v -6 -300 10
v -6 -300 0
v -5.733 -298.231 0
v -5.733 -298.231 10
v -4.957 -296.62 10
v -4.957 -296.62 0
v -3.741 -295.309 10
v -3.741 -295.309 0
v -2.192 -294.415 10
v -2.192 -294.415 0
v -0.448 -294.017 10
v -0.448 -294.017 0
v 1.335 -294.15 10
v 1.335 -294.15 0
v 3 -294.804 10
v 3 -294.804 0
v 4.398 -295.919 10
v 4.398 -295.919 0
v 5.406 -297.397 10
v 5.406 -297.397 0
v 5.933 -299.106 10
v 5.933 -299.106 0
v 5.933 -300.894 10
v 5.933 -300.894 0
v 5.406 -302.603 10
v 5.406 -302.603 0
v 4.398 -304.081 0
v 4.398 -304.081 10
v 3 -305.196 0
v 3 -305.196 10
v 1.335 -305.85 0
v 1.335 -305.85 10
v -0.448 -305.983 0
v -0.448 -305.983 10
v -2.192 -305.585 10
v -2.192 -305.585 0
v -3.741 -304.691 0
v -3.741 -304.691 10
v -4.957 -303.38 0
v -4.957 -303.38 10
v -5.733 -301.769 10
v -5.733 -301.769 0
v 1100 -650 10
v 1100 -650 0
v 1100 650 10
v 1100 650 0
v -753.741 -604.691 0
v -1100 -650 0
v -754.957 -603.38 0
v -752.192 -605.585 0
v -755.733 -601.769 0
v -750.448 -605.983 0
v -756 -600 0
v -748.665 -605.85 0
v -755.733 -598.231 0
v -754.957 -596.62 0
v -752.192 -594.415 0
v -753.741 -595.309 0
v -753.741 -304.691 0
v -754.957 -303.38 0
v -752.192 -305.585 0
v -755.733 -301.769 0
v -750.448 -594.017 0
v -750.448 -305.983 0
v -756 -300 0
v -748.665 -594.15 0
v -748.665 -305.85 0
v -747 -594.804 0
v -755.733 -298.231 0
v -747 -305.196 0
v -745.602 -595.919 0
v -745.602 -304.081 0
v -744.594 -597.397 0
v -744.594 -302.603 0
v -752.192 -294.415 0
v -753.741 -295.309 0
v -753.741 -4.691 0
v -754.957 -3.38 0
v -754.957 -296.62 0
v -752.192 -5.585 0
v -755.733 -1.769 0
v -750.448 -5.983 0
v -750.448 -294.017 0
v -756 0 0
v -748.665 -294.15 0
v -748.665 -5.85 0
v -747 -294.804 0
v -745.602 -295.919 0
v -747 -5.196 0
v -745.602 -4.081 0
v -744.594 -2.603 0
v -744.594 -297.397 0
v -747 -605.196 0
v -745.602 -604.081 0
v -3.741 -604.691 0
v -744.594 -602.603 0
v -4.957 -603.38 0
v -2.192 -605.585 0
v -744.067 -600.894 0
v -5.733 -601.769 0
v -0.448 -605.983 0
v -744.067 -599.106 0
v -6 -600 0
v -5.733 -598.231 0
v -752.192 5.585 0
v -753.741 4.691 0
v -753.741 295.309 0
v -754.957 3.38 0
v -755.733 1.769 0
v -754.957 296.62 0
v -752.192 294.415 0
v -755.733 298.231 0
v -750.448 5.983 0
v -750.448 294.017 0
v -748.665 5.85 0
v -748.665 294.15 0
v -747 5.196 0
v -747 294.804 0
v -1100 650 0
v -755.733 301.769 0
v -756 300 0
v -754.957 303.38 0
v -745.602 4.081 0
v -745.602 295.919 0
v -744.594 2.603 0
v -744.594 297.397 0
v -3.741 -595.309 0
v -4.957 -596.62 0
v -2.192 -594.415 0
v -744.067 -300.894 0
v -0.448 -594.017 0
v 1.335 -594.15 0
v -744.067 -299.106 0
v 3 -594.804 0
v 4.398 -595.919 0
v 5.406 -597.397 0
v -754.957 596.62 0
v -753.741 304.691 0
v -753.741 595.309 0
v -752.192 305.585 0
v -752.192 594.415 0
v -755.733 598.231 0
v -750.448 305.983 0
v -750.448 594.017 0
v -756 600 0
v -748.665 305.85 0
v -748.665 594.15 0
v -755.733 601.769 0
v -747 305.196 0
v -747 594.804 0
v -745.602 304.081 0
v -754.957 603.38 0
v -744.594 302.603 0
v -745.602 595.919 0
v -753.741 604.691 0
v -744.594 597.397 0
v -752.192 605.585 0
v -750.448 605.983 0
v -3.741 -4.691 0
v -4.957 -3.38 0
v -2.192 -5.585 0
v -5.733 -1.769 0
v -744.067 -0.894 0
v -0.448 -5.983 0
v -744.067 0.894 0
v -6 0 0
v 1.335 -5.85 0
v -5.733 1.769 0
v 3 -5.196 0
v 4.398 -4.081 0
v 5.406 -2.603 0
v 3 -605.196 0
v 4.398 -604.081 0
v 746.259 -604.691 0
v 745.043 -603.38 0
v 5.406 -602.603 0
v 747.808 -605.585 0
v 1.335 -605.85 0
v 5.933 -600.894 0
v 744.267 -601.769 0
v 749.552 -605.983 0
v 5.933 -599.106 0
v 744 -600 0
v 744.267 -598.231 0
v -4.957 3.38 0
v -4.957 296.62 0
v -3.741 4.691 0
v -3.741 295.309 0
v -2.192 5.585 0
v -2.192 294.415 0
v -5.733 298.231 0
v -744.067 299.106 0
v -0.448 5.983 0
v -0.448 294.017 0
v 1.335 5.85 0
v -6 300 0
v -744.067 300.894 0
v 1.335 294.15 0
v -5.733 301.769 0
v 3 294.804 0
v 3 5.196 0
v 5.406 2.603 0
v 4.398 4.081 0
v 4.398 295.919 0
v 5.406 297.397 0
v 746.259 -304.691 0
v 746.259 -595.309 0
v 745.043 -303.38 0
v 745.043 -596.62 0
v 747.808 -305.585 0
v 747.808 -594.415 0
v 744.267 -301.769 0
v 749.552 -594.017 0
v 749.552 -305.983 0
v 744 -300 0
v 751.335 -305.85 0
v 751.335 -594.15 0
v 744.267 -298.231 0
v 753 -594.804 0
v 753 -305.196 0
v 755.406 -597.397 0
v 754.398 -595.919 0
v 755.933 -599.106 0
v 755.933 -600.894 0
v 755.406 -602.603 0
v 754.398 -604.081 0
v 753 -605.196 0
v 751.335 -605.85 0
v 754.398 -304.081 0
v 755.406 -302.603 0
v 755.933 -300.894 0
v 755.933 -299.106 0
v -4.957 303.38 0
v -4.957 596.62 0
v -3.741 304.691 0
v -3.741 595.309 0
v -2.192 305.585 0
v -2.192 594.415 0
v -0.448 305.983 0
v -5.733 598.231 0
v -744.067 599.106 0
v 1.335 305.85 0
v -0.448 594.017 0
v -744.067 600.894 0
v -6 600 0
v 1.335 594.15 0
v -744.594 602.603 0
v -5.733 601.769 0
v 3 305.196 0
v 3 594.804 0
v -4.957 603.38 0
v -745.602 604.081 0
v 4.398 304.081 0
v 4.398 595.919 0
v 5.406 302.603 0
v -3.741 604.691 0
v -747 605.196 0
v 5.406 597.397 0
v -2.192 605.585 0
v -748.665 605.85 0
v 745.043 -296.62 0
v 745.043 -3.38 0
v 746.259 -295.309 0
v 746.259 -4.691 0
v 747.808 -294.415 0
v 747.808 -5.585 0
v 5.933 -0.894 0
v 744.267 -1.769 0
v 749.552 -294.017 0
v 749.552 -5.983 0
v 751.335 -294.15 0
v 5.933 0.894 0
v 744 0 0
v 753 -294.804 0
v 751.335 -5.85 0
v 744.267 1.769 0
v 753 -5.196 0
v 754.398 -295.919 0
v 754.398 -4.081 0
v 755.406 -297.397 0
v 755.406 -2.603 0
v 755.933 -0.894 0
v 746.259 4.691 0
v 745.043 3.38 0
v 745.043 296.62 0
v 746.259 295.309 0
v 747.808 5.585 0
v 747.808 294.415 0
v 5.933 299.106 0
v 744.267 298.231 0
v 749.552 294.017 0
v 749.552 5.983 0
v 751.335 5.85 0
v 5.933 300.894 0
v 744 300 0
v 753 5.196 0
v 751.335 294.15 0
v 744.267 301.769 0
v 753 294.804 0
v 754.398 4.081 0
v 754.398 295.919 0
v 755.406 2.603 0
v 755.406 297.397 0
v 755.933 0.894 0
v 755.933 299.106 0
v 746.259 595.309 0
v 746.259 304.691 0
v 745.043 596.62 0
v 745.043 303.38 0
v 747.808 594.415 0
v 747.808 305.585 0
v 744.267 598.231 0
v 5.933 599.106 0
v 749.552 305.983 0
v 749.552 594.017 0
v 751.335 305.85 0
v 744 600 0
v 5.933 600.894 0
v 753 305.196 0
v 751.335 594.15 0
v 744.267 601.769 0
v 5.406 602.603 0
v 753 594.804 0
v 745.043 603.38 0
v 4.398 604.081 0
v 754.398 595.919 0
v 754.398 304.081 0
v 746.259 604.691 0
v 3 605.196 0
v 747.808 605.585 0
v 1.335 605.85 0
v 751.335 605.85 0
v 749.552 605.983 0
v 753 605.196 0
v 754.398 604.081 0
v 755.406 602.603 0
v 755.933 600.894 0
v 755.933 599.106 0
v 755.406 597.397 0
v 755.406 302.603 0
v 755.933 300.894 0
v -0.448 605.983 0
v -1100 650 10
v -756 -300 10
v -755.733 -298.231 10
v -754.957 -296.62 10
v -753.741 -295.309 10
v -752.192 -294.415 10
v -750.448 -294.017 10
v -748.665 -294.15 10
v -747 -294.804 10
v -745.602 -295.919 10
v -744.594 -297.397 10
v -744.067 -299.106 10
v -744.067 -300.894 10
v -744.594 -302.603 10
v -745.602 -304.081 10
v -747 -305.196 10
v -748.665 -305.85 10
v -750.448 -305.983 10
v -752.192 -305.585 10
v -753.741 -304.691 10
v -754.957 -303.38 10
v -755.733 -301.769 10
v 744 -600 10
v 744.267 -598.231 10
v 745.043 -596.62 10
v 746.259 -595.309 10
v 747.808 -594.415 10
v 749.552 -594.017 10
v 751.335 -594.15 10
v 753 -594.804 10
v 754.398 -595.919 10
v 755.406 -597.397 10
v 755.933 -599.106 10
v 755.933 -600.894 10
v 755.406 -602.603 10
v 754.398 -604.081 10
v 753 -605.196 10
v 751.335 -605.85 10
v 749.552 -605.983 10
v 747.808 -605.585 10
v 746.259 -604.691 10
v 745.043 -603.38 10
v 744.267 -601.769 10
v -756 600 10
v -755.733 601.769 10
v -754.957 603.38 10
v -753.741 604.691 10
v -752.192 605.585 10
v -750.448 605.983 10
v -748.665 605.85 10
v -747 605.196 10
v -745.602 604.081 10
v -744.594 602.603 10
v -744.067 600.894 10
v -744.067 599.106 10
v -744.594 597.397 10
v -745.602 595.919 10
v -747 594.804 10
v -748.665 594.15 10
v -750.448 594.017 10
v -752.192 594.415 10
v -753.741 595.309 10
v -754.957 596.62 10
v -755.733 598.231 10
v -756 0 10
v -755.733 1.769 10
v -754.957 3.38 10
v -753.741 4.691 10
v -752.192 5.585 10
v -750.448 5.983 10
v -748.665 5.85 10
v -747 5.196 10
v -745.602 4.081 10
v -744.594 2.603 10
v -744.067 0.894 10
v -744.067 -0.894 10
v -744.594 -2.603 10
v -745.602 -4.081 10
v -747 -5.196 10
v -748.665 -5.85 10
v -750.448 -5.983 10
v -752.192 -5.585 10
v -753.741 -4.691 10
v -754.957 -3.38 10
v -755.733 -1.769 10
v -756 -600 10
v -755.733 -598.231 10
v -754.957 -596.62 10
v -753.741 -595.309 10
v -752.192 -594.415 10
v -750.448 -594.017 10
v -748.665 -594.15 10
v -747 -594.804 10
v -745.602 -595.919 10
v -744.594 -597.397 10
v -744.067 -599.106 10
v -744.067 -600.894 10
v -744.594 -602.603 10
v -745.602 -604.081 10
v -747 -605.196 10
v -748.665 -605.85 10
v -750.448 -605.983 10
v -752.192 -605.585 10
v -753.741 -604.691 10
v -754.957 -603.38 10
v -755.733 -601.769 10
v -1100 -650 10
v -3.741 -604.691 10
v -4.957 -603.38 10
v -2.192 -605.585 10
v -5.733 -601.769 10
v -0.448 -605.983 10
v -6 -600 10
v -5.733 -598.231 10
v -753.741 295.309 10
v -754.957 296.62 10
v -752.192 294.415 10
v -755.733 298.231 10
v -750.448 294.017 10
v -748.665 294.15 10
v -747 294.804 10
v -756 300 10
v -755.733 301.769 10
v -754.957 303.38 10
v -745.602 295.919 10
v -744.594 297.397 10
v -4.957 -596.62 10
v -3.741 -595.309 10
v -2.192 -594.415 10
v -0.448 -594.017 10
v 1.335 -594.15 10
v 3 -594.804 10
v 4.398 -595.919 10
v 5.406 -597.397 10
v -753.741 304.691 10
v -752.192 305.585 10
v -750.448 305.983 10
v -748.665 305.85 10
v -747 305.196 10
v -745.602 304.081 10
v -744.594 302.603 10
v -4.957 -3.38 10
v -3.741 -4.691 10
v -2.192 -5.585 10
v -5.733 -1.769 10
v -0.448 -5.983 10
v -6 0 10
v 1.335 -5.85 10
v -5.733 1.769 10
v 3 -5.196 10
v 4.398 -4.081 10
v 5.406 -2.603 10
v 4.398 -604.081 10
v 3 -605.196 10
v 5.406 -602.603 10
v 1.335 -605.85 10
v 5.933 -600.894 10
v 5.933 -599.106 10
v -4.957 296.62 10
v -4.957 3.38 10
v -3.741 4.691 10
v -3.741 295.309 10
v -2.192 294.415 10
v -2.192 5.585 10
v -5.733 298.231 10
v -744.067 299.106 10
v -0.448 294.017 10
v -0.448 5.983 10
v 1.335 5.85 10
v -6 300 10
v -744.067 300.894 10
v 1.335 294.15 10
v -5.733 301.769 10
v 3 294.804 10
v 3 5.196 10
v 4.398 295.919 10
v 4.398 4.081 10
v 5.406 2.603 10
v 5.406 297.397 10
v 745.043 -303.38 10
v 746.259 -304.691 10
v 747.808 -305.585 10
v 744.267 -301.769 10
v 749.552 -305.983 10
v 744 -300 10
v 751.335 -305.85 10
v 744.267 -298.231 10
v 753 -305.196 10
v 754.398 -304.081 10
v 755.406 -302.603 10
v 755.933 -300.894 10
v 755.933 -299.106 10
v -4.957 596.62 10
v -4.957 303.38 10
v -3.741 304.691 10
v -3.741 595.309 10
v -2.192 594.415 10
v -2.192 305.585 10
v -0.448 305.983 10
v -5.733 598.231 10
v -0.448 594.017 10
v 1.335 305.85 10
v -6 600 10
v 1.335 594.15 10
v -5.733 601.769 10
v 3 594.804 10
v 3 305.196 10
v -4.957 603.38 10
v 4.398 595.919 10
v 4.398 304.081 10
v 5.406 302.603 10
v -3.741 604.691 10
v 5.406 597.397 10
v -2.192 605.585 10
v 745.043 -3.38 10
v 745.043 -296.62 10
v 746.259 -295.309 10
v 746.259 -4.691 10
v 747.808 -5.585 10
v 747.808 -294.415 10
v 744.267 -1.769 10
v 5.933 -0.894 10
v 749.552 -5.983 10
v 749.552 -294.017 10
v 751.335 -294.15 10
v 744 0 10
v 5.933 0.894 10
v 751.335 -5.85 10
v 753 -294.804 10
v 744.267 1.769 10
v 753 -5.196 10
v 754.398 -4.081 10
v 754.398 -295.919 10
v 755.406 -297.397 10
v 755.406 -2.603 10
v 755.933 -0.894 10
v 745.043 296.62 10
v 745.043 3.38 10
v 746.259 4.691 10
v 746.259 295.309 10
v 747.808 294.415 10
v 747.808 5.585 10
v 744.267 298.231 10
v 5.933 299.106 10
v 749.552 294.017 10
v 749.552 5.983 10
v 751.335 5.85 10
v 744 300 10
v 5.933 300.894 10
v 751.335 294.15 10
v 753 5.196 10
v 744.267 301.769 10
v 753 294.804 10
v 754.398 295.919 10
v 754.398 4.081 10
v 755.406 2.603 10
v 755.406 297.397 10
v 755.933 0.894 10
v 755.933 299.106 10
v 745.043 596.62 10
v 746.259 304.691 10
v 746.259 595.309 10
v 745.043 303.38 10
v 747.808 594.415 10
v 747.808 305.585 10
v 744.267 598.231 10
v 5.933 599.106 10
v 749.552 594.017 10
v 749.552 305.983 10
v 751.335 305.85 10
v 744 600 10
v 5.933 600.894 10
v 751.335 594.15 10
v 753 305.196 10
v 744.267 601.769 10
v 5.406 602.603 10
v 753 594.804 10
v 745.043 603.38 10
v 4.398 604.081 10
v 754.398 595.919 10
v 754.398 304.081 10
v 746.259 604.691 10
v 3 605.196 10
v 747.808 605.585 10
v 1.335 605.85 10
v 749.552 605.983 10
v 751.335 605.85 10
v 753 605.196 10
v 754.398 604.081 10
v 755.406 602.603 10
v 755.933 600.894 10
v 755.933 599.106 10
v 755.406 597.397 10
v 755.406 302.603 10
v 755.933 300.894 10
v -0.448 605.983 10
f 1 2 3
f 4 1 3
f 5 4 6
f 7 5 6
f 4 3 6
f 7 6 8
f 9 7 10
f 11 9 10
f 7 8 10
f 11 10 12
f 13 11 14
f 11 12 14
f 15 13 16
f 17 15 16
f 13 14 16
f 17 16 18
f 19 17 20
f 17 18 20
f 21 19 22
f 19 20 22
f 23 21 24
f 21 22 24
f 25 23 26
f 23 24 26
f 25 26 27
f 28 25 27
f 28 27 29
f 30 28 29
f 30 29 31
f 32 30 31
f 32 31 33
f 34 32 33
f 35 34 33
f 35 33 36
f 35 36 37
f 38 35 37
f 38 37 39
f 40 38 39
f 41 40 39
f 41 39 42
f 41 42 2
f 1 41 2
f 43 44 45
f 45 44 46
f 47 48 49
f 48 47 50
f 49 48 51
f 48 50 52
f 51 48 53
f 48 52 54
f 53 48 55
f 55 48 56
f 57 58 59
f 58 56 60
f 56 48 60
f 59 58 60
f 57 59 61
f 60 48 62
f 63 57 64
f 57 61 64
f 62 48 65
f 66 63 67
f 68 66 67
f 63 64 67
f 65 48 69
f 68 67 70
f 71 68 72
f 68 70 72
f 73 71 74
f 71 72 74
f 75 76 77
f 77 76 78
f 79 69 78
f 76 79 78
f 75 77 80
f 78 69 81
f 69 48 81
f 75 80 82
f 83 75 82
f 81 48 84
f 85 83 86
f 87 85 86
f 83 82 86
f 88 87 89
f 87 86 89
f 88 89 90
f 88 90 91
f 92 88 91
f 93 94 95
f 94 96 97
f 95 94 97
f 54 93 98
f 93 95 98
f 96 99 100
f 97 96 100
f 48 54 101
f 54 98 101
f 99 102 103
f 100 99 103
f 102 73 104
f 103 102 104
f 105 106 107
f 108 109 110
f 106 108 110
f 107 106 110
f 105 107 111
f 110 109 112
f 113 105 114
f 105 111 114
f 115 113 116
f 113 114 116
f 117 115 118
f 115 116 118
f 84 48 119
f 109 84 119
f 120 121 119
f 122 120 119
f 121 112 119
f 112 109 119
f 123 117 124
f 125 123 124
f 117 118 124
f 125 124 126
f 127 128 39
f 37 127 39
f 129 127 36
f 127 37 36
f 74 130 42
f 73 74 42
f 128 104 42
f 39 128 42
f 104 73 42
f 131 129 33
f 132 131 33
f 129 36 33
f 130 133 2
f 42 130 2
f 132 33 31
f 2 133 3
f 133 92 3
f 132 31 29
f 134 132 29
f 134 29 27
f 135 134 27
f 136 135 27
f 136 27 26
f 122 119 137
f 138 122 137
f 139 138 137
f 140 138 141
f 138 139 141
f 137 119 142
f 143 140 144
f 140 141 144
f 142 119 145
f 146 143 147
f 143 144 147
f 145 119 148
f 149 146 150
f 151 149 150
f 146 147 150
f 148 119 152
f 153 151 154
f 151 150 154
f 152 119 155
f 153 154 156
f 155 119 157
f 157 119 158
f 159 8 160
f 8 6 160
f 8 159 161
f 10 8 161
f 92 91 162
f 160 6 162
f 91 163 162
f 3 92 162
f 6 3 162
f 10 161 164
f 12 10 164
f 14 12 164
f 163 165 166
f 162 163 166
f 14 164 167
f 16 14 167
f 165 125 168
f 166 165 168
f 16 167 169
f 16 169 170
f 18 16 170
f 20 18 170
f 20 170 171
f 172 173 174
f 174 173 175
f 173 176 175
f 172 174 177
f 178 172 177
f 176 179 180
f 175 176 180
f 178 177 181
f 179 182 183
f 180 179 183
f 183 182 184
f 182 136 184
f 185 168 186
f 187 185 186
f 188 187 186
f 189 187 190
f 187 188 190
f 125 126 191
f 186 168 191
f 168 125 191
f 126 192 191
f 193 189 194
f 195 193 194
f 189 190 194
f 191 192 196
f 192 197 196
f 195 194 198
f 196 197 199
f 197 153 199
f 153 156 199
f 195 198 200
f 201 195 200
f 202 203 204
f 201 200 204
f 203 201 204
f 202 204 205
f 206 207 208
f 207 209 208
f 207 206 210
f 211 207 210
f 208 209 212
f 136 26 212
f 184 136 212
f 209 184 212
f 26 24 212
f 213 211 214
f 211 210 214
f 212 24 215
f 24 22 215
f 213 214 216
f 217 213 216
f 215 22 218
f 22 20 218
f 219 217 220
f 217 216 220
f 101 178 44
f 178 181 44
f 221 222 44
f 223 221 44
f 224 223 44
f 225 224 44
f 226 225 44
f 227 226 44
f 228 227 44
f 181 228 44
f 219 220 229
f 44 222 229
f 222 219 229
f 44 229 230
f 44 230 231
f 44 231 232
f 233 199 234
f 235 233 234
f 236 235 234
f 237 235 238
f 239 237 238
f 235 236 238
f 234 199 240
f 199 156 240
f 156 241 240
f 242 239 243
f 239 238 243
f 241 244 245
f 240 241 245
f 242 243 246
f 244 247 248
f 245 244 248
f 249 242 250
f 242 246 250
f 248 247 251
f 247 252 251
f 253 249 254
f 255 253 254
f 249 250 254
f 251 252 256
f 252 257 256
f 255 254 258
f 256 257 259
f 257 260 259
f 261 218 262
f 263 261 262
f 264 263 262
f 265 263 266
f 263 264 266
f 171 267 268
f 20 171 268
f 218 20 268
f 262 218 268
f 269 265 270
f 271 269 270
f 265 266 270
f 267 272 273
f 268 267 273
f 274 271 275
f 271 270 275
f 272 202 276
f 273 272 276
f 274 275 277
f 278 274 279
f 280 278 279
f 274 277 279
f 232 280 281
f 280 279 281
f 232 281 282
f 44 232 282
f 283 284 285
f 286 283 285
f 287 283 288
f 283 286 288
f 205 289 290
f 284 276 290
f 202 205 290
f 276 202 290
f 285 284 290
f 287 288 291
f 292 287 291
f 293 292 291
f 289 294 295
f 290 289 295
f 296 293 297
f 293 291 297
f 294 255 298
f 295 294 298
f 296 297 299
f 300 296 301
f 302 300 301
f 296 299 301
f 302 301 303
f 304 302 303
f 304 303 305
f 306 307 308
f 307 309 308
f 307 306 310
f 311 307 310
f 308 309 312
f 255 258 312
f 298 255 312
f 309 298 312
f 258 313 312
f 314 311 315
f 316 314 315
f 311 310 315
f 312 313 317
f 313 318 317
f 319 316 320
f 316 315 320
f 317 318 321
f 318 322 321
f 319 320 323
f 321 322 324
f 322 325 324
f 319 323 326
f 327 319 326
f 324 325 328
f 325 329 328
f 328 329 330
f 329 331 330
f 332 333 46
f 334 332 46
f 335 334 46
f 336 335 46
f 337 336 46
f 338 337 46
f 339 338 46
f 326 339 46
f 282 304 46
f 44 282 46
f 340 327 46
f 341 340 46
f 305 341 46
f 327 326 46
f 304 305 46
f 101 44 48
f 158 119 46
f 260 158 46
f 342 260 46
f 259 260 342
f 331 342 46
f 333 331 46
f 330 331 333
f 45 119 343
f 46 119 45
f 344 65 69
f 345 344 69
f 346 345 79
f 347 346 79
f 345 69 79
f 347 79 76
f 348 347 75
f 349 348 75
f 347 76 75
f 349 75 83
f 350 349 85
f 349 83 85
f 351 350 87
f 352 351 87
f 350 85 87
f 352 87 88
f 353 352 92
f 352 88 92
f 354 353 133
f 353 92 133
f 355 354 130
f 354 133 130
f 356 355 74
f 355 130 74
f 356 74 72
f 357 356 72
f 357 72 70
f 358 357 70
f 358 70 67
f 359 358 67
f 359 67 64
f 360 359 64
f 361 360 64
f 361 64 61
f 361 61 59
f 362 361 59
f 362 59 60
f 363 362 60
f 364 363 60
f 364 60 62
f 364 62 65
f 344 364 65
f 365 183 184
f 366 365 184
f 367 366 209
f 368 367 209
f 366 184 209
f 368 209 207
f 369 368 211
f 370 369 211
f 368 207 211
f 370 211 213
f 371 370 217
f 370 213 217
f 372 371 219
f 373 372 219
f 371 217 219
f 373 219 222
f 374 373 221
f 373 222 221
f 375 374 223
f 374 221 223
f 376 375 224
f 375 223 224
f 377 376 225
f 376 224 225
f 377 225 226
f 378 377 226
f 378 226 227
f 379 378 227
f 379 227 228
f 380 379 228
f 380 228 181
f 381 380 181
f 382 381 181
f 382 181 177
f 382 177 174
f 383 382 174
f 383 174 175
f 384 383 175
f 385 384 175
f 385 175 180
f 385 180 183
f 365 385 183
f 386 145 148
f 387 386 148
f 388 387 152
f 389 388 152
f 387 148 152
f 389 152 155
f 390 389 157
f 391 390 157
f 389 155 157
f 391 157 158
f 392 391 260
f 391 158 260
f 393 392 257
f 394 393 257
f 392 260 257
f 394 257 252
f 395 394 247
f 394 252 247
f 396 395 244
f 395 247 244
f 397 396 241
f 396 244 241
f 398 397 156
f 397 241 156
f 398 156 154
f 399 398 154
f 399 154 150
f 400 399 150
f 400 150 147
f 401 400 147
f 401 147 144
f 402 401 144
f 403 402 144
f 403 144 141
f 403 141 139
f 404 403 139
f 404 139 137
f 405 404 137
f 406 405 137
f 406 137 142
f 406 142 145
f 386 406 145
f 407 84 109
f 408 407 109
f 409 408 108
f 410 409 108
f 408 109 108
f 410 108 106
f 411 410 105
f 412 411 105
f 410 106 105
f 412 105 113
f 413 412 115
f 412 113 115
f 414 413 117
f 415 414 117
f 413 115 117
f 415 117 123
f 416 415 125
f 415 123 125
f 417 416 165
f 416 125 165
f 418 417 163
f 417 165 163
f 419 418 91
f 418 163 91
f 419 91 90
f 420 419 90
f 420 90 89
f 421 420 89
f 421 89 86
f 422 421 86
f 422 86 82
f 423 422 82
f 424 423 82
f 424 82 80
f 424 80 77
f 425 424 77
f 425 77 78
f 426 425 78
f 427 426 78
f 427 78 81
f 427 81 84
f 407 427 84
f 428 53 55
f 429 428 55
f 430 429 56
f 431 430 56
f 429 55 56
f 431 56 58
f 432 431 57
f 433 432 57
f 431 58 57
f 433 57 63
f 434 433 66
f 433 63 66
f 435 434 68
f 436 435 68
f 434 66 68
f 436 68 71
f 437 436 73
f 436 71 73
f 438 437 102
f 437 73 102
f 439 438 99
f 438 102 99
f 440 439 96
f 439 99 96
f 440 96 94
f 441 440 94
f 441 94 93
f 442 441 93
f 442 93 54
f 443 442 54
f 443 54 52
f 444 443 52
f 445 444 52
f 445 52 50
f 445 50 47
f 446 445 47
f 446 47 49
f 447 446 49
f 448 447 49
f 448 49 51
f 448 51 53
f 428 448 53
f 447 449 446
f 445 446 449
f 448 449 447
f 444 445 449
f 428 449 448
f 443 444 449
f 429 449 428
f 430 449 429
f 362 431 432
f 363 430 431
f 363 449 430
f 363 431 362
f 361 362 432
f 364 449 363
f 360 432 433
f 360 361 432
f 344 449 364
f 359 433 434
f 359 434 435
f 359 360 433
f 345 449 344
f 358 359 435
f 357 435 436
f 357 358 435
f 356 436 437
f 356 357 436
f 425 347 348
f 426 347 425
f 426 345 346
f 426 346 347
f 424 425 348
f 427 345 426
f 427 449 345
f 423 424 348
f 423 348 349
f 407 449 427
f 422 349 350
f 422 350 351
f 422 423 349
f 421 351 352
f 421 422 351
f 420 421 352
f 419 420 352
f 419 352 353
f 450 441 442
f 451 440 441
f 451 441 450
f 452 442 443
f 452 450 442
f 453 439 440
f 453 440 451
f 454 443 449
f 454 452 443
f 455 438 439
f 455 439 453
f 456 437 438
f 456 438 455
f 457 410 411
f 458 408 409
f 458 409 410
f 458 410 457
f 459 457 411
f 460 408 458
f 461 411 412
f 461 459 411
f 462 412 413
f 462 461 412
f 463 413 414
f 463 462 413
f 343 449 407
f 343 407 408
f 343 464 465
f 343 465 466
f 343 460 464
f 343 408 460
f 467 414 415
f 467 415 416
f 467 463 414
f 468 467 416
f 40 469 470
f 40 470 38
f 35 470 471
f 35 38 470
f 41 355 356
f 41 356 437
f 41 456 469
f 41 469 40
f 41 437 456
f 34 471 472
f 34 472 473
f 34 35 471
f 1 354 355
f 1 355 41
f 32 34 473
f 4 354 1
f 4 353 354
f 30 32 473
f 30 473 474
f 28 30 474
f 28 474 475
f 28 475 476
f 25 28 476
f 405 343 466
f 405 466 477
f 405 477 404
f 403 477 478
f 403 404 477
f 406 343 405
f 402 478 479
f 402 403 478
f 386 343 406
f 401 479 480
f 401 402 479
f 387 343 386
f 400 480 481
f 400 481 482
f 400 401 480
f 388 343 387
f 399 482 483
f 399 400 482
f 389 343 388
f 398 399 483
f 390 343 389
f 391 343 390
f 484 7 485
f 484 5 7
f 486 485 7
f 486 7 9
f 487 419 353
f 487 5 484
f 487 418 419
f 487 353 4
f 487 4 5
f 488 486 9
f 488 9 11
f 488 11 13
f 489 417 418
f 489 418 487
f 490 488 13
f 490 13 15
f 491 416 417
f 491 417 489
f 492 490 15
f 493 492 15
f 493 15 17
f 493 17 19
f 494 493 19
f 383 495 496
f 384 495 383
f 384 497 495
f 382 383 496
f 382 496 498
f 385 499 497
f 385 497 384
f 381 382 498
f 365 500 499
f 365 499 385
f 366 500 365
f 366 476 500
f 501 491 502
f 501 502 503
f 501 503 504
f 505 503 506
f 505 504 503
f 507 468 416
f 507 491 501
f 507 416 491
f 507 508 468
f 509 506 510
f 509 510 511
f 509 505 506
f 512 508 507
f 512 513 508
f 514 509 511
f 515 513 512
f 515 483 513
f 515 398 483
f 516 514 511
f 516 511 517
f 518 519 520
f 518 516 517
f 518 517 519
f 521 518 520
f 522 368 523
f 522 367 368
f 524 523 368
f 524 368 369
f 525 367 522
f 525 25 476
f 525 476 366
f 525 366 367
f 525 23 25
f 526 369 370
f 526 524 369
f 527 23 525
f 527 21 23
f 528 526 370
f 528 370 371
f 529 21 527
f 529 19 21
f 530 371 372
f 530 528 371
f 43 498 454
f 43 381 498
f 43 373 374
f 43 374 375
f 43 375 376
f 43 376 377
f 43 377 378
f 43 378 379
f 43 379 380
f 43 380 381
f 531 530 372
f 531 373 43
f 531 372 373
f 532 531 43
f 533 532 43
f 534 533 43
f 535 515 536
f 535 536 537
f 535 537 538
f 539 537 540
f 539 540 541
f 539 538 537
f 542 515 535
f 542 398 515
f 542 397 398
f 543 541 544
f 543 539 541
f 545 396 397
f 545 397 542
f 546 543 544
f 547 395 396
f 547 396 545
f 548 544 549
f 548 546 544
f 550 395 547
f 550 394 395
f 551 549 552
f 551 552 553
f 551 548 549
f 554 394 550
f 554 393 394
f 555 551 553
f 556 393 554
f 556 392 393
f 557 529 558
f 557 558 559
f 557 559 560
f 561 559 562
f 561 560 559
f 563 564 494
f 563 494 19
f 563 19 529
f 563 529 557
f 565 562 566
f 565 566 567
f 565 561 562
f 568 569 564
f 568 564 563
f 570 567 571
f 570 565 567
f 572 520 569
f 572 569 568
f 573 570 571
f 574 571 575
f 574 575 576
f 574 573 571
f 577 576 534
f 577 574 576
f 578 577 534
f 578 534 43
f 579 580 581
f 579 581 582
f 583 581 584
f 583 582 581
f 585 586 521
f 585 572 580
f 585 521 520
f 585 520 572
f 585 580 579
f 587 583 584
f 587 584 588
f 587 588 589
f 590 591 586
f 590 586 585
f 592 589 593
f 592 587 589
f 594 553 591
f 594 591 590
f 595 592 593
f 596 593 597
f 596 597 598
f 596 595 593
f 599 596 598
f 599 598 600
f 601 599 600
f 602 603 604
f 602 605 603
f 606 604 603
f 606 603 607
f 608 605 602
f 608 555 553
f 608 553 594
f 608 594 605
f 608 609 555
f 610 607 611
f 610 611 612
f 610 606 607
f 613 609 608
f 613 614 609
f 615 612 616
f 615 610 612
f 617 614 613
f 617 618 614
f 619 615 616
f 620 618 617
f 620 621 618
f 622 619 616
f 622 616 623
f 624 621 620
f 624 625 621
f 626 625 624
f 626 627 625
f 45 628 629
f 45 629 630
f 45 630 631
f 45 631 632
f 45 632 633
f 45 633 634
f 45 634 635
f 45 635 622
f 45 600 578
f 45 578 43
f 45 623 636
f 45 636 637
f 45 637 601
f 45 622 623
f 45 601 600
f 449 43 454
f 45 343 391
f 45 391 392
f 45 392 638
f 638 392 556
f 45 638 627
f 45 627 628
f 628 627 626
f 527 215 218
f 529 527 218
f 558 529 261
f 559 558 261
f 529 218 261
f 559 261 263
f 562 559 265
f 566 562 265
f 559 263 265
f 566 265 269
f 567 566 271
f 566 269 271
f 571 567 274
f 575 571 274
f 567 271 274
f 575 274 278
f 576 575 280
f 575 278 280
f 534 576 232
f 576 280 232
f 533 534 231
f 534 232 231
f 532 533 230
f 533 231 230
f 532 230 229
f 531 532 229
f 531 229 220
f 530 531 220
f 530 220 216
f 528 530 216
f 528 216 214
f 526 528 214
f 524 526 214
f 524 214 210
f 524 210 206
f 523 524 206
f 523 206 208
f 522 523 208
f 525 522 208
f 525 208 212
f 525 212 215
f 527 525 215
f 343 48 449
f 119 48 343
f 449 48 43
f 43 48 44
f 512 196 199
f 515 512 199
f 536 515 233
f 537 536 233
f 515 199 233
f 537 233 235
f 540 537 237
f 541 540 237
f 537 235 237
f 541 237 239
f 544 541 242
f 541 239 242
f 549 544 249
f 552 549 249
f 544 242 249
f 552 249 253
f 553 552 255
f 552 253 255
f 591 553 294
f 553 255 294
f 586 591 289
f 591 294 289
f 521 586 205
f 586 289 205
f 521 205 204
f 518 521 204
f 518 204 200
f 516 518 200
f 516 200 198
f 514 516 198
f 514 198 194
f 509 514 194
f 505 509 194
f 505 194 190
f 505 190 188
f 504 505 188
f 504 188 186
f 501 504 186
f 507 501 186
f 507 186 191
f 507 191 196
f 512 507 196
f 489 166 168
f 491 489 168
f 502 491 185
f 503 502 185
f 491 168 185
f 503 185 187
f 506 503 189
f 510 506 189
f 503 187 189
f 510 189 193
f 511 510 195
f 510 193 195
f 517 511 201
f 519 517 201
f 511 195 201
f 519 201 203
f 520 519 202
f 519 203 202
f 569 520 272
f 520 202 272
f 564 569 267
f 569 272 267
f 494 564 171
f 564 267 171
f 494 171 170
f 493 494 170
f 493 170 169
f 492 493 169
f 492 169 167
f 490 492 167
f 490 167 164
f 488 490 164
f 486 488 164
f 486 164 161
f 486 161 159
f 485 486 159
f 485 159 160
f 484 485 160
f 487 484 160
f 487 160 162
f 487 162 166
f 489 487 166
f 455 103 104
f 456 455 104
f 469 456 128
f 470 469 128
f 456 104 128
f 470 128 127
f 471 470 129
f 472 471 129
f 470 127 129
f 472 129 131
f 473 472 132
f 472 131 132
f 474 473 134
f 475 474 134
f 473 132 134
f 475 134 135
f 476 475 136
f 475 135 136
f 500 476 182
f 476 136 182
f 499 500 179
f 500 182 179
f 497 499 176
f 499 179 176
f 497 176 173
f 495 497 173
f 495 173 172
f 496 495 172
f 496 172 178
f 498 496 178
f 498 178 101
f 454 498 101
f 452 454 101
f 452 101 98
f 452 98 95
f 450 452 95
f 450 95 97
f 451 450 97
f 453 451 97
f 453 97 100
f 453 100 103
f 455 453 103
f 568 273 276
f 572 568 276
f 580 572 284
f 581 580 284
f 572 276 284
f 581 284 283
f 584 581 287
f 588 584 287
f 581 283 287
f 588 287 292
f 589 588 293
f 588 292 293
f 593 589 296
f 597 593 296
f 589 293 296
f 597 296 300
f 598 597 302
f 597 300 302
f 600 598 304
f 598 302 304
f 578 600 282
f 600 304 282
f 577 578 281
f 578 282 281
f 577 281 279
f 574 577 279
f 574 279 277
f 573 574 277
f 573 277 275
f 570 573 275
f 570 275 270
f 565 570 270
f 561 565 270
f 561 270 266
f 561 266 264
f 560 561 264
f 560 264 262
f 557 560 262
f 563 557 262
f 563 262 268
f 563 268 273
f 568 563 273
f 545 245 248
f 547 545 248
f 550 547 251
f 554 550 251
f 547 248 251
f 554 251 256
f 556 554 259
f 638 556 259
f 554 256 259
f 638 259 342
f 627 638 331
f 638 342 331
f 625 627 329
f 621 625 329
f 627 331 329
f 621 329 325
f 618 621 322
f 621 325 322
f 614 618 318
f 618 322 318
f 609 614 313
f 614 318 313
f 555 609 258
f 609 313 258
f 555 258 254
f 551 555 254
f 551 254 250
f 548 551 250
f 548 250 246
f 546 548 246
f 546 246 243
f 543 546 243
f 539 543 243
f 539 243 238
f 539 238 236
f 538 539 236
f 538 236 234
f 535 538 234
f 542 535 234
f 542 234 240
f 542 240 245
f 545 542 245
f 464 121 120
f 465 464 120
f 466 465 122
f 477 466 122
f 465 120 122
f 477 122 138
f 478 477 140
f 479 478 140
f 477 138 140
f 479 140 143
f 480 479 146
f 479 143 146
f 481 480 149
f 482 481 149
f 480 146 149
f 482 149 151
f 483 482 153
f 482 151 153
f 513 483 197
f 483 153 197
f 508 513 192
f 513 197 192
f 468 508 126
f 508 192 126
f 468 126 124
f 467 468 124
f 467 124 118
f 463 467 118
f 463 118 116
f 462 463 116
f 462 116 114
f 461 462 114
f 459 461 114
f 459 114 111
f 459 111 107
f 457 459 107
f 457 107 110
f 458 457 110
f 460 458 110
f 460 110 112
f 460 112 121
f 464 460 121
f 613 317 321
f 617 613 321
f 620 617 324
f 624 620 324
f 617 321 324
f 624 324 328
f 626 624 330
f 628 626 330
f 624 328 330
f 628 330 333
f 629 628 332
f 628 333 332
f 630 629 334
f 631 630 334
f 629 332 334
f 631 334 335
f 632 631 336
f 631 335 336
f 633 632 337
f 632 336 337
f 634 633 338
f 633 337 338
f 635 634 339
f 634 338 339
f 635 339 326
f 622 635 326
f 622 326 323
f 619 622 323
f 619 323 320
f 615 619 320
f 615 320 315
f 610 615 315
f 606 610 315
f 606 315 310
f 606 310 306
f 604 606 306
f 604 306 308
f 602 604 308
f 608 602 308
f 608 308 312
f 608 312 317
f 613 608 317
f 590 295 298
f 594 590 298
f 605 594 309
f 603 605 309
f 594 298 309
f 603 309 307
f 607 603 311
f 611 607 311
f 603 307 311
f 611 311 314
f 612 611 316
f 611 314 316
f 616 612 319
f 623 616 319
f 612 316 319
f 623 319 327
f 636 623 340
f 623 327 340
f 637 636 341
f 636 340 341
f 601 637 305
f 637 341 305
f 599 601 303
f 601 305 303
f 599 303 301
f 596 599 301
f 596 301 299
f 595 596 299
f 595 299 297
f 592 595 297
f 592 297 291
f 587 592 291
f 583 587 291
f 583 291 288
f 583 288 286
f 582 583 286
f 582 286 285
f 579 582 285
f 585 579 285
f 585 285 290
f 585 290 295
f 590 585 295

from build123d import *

# Parameters (mm, degrees)
SZKIC1_W                    = 2200
SZKIC1_H                    = 1300
DODANIE_WYCI_GNI_CIE1_DEPTH = 10
OTW_R_POD_RUB_M101_D        = 12
SZYK_LINIOWY1_COUNT         = 5
SZYK_LINIOWY1_PITCH         = 300
SZYK_LINIOWY1_COUNT_DIR2    = 3
SZYK_LINIOWY1_PITCH_DIR2    = 750


with BuildPart() as part:
    # Szkic1 → Dodanie-wyciągnięcie1 (new body)
    with BuildSketch(Plane.XY):
        Rectangle(SZKIC1_W, SZKIC1_H)
    extrude(amount=DODANIE_WYCI_GNI_CIE1_DEPTH)

    # Otwór pod śrubę M101 (through all)
    with Locations(Plane.XY.offset(10)):
        with Locations((-750, -600)):
            otw_r_pod_rub_m101 = Hole(OTW_R_POD_RUB_M101_D / 2)

    # Szyk liniowy1: Otw_r pod _rub_ M101 5 × 3
    with Locations(*[(j * SZYK_LINIOWY1_PITCH_DIR2, i * SZYK_LINIOWY1_PITCH, 0) for i in range(SZYK_LINIOWY1_COUNT) for j in range(SZYK_LINIOWY1_COUNT_DIR2) if (i, j) != (0, 0)]):
        add(otw_r_pod_rub_m101, mode=Mode.SUBTRACT)


solid = part.part
